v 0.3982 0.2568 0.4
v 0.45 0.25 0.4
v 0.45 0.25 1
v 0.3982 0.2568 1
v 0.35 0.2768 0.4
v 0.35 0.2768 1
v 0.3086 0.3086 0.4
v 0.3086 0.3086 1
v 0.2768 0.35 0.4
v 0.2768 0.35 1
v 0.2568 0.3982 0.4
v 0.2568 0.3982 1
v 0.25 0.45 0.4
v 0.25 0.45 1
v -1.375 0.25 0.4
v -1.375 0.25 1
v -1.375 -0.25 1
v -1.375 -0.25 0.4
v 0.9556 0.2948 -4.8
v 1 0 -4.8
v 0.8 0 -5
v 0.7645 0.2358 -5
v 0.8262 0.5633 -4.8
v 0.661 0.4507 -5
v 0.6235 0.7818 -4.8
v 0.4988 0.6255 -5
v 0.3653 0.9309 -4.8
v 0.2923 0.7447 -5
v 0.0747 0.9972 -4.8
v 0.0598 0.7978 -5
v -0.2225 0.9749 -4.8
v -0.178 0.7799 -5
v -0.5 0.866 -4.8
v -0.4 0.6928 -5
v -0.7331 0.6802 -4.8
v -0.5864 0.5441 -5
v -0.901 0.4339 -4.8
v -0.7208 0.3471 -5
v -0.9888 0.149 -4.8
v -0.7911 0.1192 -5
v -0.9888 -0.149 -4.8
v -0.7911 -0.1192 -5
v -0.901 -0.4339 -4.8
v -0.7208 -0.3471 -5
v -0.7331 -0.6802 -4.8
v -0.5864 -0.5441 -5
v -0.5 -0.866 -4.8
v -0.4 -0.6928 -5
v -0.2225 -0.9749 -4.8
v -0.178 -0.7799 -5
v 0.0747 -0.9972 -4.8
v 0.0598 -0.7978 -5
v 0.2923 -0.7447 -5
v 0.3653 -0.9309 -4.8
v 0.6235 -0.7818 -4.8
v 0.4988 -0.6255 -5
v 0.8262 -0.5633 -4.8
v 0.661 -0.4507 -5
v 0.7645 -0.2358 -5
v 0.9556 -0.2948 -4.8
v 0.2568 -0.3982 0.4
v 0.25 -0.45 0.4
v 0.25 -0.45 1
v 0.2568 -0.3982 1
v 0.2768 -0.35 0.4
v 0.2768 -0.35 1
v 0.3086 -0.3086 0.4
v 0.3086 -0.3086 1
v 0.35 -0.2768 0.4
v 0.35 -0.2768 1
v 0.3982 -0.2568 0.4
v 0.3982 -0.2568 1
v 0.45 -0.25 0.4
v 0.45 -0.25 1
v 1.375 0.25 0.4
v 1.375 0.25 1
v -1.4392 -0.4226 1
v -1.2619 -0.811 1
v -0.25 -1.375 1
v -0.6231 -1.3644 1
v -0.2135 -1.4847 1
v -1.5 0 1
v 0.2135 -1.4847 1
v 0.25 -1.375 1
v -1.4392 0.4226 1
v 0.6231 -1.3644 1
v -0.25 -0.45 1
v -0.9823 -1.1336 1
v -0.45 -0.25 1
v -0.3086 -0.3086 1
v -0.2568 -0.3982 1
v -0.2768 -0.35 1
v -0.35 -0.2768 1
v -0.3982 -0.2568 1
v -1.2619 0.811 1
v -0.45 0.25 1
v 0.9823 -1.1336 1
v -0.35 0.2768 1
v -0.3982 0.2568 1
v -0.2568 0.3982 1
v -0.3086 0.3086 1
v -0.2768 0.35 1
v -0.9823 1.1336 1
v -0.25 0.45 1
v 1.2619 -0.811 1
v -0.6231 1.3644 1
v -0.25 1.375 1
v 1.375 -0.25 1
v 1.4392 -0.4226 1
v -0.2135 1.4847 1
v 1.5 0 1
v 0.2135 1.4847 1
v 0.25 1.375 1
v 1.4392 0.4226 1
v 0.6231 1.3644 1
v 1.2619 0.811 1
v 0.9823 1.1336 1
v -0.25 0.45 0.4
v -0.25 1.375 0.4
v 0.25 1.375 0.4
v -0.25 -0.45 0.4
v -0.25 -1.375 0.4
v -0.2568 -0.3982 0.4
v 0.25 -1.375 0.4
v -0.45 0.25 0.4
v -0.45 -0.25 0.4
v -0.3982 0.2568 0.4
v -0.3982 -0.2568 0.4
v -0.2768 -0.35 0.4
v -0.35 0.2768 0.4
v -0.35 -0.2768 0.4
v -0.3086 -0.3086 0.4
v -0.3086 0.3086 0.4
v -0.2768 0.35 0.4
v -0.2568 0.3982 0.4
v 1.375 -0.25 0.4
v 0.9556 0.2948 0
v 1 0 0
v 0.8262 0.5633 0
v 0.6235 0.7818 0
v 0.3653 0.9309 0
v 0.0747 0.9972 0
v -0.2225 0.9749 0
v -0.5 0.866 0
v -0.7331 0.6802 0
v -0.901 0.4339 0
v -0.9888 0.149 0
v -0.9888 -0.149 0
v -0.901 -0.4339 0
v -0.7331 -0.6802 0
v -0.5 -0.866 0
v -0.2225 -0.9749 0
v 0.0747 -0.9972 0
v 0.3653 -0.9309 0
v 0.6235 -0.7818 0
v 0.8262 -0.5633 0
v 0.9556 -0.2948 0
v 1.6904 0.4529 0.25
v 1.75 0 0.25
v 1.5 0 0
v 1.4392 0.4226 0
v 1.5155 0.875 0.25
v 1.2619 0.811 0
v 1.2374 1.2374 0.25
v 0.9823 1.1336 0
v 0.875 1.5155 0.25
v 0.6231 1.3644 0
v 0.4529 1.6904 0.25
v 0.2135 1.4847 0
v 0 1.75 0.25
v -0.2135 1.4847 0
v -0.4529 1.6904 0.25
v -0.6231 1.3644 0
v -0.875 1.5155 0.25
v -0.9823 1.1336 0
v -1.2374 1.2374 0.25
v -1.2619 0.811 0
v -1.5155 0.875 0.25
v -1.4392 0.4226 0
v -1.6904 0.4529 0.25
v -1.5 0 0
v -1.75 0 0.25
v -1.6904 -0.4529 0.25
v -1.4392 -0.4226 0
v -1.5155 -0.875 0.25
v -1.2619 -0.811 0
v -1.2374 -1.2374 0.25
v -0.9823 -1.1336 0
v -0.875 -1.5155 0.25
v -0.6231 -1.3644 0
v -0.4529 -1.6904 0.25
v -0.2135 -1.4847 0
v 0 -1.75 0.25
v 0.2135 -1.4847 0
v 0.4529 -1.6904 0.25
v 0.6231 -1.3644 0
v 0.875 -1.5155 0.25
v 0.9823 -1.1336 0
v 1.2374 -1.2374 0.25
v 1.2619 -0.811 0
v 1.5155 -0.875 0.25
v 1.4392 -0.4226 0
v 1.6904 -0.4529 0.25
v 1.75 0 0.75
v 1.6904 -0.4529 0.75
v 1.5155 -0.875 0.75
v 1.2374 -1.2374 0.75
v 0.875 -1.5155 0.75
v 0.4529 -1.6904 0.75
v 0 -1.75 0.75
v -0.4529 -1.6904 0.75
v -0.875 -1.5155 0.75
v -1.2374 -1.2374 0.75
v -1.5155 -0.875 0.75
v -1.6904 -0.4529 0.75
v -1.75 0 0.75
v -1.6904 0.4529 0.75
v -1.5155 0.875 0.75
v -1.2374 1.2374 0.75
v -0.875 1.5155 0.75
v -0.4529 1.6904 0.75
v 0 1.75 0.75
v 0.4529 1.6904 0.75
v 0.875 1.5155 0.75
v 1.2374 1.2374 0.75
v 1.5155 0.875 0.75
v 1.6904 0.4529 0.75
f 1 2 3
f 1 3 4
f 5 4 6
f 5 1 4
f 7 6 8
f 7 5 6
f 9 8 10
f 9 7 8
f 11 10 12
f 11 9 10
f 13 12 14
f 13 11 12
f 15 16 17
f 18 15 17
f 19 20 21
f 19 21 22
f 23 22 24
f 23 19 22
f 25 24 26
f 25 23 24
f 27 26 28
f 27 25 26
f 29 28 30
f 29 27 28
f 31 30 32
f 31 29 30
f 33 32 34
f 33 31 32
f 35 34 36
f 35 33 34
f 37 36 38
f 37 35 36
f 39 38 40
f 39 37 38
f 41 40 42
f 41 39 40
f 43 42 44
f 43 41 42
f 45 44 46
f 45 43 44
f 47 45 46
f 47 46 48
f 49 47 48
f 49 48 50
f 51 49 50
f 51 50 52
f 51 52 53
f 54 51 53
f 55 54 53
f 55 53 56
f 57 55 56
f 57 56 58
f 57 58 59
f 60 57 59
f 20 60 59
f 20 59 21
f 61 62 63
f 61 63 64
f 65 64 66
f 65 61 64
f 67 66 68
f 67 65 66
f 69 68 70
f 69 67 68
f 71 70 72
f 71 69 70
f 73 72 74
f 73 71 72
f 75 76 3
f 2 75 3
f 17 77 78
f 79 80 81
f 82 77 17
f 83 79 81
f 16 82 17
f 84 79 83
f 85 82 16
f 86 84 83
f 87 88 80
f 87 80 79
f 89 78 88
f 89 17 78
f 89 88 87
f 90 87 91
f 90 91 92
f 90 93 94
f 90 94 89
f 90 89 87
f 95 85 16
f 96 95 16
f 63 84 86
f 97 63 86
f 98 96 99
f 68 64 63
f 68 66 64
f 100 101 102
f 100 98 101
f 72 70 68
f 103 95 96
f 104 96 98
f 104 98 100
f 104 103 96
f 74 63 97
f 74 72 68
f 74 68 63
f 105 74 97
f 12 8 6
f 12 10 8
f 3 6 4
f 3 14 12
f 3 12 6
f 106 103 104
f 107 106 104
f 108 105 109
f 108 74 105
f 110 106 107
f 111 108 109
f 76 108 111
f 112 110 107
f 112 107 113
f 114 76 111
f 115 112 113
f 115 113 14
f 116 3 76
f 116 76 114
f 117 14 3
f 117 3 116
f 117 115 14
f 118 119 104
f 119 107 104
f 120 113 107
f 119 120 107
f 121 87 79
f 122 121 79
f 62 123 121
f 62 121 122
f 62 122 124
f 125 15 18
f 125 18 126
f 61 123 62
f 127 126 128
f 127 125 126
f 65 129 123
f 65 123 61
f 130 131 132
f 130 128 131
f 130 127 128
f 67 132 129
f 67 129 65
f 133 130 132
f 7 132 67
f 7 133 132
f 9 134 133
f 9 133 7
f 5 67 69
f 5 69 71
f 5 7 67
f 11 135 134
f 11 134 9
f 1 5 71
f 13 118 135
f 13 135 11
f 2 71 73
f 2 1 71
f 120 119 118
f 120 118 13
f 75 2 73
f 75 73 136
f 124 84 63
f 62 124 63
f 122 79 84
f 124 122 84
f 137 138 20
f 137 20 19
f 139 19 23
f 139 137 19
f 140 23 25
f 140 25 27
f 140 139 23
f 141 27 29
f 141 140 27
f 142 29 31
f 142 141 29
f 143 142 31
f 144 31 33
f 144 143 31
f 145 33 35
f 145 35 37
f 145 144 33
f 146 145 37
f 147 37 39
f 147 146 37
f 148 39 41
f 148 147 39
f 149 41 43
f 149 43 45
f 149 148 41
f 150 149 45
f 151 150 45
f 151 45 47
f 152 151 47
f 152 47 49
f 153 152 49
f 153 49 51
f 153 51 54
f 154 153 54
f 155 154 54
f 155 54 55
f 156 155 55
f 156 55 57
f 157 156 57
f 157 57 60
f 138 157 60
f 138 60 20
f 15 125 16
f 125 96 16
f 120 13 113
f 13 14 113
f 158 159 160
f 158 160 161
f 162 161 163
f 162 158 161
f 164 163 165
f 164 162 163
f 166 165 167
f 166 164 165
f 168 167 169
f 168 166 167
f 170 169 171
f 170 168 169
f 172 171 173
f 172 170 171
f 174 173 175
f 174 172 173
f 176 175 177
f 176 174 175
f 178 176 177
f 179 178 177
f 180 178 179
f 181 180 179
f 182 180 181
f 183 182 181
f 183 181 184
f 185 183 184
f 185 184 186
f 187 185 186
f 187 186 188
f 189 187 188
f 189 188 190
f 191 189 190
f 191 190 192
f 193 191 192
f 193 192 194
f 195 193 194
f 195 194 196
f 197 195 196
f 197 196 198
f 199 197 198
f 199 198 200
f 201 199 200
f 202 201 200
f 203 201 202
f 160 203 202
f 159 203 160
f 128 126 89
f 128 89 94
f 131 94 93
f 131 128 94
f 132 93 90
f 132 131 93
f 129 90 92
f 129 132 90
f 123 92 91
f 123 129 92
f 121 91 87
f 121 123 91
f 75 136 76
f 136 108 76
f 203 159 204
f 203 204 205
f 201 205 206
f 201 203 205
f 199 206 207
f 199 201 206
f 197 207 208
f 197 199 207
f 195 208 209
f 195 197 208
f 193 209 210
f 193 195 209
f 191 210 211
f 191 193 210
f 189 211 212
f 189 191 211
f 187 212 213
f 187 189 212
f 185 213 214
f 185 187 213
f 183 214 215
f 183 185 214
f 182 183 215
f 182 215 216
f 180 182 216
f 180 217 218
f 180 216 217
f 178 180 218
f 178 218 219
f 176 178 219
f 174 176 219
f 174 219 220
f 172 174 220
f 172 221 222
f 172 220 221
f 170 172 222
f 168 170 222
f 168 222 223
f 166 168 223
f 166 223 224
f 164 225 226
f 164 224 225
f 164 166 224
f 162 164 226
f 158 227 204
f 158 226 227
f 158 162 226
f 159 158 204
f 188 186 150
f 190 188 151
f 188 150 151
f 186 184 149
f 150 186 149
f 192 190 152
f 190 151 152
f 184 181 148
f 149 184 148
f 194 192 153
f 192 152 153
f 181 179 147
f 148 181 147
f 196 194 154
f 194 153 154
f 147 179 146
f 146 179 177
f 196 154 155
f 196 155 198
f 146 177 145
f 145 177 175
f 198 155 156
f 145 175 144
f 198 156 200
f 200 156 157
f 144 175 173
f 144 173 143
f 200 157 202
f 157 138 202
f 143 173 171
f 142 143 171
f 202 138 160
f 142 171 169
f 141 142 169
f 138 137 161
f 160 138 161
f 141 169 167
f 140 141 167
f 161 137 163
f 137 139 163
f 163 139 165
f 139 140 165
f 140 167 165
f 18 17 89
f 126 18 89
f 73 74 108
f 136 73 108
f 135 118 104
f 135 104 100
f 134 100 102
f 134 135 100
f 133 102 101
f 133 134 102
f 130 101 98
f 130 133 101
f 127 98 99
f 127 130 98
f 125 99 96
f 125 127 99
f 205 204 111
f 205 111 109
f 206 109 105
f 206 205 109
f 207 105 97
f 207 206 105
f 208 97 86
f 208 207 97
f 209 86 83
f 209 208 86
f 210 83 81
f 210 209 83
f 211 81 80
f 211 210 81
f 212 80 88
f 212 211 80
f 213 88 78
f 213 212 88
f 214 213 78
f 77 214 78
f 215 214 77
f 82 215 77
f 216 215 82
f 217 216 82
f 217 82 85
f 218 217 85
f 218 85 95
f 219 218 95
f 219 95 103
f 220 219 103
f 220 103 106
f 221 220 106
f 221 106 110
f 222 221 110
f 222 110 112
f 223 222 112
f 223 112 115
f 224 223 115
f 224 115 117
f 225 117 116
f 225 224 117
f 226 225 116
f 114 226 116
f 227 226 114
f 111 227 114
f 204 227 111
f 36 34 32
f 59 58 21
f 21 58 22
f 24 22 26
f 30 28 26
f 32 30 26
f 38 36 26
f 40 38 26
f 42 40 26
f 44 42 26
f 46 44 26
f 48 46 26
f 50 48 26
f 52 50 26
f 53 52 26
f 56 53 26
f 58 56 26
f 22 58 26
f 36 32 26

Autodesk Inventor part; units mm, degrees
ref_plane "YZ Plane" through (0, 0, 0) normal (1, 0, 0) x (0, 1, 0)
ref_plane "XZ Plane" through (0, 0, 0) normal (0, 1, 0) x (-1, 0, 0)
ref_plane "XY Plane" through (0, 0, 0) normal (0, 0, 1) x (1, 0, 0)
sketch "Esboço1" plane through (0, 0, 0) normal (0, 0, 1) x (1, 0, 0)
  circle A0 centre (0, 0) radius 1
  dimension "d0" = 2
extrude "Extrusão1" add sketch "Esboço1" against normal blind 5
sketch "Esboço2" plane through (0, 0, 0) normal (0, 0, 1) x (1, 0, 0)
  circle A0 centre (0, 0) radius 1.75
  dimension "d3" = 3.5
extrude "Extrusão2" add sketch "Esboço2" along normal blind 1
sketch "Esboço3" plane through (0, 0, 1) normal (0, 0, 1) x (1, 0, 0)
  line L0 (-0.25, -1.375) -> (0.25, -1.375)
  line L1 (0.25, -1.375) -> (0.25, 1.375)
  line L2 (0.25, 1.375) -> (-0.25, 1.375)
  line L3 (-0.25, 1.375) -> (-0.25, -1.375)
  line L4 (-0.25, -1.375) -> (0.25, 1.375) construction
  line L5 (0.25, -1.375) -> (-0.25, 1.375) construction
  line L6 (-1.375, -0.25) -> (1.375, -0.25)
  line L7 (1.375, -0.25) -> (1.375, 0.25)
  line L8 (1.375, 0.25) -> (-1.375, 0.25)
  line L9 (-1.375, 0.25) -> (-1.375, -0.25)
  line L10 (-1.375, -0.25) -> (1.375, 0.25) construction
  line L11 (1.375, -0.25) -> (-1.375, 0.25) construction
  point P0 (0, 0)
  point P1 (-0.25, 0.25)
  point P2 (-0.25, -0.25)
  point P3 (0.25, -0.25)
  point P4 (0.25, 0.25)
  dimension "d6" = 0.5
  dimension "d7" = 0.5
  dimension "d8" = 2.75
  dimension "d9" = 2.75
extrude "Extrusão3" cut sketch "Esboço3" against normal blind 0.6
thread "Rosca1" size "M2x0.4" class "6g" standard "ANSI Metric M Profile" length 15.255
fillet "Arredondamento2" radius 0.2 4 edges at (-0.25, 0.25, 0.7) (0.25, 0.25, 0.7) (-0.25, -0.25, 0.7) (0.25, -0.25, 0.7)
chamfer "Chanfro1" distance 0.25 angle 45 2 edges at (-1.75, 0, 1) (-1.75, 0, 0)
chamfer "Chanfro2" distance 0.2 angle 45 1 edges at (-1, 0, -5)
properties part number "Parafuso 2 mm" material "Liga de Nickel-Copper 400"
